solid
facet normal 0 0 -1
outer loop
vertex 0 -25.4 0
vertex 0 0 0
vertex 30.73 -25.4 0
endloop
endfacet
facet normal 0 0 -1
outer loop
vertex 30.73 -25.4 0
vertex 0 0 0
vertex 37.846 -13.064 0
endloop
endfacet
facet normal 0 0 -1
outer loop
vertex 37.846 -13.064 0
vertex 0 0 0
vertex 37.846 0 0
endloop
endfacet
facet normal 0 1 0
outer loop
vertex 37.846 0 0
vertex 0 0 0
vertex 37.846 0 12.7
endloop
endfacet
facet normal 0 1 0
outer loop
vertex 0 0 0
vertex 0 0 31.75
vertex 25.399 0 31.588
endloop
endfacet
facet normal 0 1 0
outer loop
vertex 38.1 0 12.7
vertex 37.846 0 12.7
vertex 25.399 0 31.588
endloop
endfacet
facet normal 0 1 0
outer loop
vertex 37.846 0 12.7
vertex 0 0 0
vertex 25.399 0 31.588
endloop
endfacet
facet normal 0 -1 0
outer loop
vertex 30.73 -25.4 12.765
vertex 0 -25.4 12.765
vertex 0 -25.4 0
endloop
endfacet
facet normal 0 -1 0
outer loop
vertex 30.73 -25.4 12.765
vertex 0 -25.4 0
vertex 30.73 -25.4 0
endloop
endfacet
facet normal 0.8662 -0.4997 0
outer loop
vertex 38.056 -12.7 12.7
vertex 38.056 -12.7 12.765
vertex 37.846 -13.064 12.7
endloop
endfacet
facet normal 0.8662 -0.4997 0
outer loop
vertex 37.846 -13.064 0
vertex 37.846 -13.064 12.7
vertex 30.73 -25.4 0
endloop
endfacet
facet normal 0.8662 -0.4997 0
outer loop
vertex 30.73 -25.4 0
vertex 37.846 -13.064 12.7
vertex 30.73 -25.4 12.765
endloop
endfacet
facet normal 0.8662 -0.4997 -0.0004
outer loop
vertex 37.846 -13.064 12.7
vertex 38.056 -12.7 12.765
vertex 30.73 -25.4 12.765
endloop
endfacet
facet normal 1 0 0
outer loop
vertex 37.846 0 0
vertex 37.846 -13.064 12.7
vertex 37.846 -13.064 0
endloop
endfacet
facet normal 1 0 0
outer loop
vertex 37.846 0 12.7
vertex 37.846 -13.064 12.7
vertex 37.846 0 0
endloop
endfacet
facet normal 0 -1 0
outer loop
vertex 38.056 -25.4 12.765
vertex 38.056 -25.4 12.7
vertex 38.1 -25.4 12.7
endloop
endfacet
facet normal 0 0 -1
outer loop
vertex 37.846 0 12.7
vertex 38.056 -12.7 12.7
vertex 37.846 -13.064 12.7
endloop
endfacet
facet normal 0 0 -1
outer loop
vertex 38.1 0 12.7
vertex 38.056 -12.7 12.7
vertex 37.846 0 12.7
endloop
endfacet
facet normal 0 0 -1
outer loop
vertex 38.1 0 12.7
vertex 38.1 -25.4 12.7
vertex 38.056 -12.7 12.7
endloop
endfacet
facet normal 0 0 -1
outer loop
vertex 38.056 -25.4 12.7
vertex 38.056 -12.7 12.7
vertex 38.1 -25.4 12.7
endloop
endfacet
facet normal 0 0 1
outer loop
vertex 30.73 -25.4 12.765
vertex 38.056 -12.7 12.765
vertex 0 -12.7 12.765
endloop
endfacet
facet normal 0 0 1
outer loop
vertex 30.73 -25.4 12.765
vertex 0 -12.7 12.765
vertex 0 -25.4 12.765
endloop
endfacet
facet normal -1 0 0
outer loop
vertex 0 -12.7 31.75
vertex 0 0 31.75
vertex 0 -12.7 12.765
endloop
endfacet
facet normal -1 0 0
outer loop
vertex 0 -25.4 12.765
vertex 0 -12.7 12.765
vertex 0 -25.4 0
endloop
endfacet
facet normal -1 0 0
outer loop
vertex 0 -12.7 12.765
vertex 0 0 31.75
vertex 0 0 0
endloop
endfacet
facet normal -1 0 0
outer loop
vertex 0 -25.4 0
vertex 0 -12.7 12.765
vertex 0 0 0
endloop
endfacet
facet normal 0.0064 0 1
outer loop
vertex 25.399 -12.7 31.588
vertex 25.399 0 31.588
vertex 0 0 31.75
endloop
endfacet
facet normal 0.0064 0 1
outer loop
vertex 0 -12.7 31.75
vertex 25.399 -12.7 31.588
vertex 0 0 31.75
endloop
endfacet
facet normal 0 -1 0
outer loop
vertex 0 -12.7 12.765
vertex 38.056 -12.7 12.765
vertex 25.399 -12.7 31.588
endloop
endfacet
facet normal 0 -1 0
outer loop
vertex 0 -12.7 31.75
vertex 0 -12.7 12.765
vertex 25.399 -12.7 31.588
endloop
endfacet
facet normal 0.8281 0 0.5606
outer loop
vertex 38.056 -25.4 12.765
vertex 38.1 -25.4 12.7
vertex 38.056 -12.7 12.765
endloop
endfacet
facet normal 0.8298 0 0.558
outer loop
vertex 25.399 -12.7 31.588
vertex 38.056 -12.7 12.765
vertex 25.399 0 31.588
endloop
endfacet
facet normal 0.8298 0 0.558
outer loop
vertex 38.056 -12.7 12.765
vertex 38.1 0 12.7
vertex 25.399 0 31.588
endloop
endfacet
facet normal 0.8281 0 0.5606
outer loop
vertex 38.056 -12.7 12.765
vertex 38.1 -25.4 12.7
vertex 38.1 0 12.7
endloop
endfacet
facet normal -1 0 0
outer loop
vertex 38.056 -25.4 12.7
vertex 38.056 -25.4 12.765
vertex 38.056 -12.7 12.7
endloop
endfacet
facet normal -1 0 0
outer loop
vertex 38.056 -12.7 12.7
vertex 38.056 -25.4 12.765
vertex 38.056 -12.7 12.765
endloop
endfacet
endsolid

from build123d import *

# Parameters (mm, degrees)
F1_DEPTH  = 25.4
F3_DEPTH  = 82
F1_FACE_W = 25.4
F1_FACE_H = 31.75
F4_DEPTH  = 25.4
F5_W      = 12.7
F5_H      = 18.9845859185
F6_DEPTH  = 38.101
F8_DEPTH  = 25.4
F9_W      = 25.4
F9_H      = 12.7
F10_DEPTH = 0.254


# Not quite as in the source:
# - an extrude ends at something that could not be found from the text; its depth is read off the source's solid


with BuildPart() as f1:
    # F0 (on Front) → F1 (new body)
    with BuildSketch(Plane.XZ):
        Polygon((25.3994814964, 31.5877048481), (0, 31.75), (0, 0), (38.1, 0), (38.1, 12.7), align=None)
    extrude(amount=F1_DEPTH)

    # F2 (on Right) → F3 (cut, through all)
    with BuildSketch(Plane.YZ):
        Polygon((-12.9239121452, 31.9192558527), (-25.5880542099, 31.9192558527), (-25.4064481705, 12.6858642325), (-12.9239121452, 12.6858642325), align=None)
    extrude(amount=-F3_DEPTH, mode=Mode.SUBTRACT)

    # F2 (on Right) + F1_face (on face) → F4 (cut)
    with BuildSketch(Plane.YZ):
        Polygon((-12.9239121452, 31.9192558527), (-25.5880542099, 31.9192558527), (-25.4064481705, 12.6858642325), (-12.9239121452, 12.6858642325), align=None)
    with BuildSketch(Plane(origin=(0, -12.7, 15.875), x_dir=(0, -1, 0), z_dir=(-1, 0, 0))):
        Rectangle(F1_FACE_W, F1_FACE_H)
    extrude(amount=-F4_DEPTH, dir=(1, 0, 0), mode=Mode.SUBTRACT)

    # F5 (on face) → F6 (cut, through all)
    with BuildSketch(Plane(origin=(0, 0, 0), x_dir=(0, -1, 0), z_dir=(-1, 0, 0))):
        with Locations((19.05, 22.2577070408)):
            Rectangle(F5_W, F5_H)
    extrude(amount=-F6_DEPTH, mode=Mode.SUBTRACT)

    # F7 (on face) → F8 (cut)
    with BuildSketch(Plane.XY.offset(12.7654140815)):
        Polygon((38.056014097, -25.4), (38.056014097, -12.7), (30.7297278196, -25.4), align=None)
    extrude(amount=-F8_DEPTH, mode=Mode.SUBTRACT)

    # F9 (on face) → F10 (cut)
    with BuildSketch(Plane.YZ.offset(38.1)):
        with Locations((-12.7, 6.35)):
            Rectangle(F9_W, F9_H)
    extrude(amount=-F10_DEPTH, mode=Mode.SUBTRACT)


solid = f1.part
